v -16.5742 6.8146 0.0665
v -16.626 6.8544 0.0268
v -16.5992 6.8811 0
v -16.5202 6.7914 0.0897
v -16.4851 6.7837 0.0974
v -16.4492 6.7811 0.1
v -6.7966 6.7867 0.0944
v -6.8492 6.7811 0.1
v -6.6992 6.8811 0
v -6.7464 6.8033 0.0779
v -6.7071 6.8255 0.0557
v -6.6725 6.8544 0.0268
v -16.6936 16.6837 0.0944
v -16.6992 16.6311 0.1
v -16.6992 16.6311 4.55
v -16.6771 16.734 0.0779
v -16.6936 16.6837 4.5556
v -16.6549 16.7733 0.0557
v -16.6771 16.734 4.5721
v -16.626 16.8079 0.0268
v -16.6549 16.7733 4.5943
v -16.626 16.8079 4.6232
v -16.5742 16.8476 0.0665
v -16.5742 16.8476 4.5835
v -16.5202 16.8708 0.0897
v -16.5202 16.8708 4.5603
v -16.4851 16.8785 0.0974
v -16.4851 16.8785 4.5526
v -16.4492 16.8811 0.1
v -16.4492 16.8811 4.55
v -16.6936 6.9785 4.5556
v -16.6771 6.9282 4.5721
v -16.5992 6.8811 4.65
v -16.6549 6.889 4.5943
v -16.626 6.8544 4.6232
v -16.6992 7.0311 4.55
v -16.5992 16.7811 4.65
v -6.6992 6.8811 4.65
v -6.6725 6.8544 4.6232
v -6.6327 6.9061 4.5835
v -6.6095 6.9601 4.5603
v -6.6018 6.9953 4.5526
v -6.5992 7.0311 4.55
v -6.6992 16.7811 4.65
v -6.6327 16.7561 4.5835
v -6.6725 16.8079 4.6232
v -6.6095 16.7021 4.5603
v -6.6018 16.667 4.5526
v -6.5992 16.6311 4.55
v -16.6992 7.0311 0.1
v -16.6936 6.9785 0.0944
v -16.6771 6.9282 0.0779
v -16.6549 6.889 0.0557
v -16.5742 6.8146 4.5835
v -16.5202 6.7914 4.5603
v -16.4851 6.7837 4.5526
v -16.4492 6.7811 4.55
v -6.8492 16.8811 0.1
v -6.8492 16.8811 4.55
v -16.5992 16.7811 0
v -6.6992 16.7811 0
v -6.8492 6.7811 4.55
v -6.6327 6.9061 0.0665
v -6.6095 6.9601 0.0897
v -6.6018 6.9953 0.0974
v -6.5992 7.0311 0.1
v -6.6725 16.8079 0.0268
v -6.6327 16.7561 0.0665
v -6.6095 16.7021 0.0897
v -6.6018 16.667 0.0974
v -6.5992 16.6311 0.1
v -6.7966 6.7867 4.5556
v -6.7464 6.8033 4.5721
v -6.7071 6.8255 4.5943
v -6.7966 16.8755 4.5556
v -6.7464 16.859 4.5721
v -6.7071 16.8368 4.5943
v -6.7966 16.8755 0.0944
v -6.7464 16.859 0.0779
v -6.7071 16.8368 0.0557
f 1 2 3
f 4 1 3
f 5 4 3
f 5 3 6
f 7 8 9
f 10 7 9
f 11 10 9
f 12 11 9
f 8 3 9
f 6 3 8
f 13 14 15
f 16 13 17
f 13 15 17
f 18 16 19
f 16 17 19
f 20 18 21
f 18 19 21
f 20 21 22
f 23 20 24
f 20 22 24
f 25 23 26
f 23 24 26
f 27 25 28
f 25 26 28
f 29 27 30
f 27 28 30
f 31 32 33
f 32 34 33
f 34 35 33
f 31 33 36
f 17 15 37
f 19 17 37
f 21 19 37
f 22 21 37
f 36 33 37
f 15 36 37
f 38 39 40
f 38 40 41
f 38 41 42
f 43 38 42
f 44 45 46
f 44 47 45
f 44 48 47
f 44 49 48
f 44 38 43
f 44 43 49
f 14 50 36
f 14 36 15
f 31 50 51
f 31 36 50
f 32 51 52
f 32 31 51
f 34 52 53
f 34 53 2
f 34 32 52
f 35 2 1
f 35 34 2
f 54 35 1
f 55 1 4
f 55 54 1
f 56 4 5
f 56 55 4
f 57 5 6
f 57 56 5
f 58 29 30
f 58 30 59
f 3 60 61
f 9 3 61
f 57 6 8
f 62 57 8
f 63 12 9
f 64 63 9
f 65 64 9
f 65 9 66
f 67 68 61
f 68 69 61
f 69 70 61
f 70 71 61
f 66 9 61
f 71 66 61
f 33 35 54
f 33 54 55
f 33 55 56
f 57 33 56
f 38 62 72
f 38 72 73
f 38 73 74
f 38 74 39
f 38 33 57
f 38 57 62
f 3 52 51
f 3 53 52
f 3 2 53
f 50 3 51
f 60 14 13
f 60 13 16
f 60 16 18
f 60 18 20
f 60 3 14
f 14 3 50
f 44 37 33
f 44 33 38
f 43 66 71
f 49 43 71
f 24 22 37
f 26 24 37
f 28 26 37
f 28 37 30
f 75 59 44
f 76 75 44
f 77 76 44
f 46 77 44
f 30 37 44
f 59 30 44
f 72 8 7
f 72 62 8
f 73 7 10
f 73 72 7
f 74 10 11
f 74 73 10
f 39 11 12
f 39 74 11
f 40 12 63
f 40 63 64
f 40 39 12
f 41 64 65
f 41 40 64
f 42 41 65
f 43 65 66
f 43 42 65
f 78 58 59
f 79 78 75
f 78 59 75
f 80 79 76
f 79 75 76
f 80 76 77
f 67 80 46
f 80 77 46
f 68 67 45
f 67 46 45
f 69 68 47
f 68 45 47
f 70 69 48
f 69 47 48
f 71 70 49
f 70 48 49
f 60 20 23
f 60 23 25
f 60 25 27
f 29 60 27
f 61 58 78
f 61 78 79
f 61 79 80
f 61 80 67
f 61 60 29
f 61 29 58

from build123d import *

# Parameters (mm, degrees)
SKETCH008_W     = 10.1
SKETCH008_H     = 10.1
PAD004_DEPTH    = 4.65
CHAMFER001_SIZE = 0.1
FILLET004_R     = 0.25


with BuildPart() as part:
    # Sketch008 → Pad004 (new body)
    with BuildSketch(Plane.XY):
        with Locations((-11.649234, 11.831128)):
            Rectangle(SKETCH008_W, SKETCH008_H)
    extrude(amount=PAD004_DEPTH)

    # Chamfer001
    chamfer001_edges = [part.edges().sort_by_distance(p)[0] for p in [
        (-16.699234, 11.831128, 4.65),
        (-11.649234, 6.781128, 4.65),
        (-6.599234, 11.831128, 4.65),
        (-11.649234, 16.881128, 4.65),
        (-16.699234, 11.831128, 0),
        (-11.649234, 6.781128, 0),
        (-6.599234, 11.831128, 0),
        (-11.649234, 16.881128, 0),
    ]]
    chamfer(chamfer001_edges, length=CHAMFER001_SIZE)

    # Fillet004
    fillet004_edges = [part.edges().sort_by_distance(p)[0] for p in [
        (-16.699234, 6.781128, 2.325),
        (-6.599234, 6.781128, 2.325),
        (-6.599234, 16.881128, 2.325),
        (-16.699234, 16.881128, 2.325),
    ]]
    fillet(fillet004_edges, radius=FILLET004_R)


solid = part.part
